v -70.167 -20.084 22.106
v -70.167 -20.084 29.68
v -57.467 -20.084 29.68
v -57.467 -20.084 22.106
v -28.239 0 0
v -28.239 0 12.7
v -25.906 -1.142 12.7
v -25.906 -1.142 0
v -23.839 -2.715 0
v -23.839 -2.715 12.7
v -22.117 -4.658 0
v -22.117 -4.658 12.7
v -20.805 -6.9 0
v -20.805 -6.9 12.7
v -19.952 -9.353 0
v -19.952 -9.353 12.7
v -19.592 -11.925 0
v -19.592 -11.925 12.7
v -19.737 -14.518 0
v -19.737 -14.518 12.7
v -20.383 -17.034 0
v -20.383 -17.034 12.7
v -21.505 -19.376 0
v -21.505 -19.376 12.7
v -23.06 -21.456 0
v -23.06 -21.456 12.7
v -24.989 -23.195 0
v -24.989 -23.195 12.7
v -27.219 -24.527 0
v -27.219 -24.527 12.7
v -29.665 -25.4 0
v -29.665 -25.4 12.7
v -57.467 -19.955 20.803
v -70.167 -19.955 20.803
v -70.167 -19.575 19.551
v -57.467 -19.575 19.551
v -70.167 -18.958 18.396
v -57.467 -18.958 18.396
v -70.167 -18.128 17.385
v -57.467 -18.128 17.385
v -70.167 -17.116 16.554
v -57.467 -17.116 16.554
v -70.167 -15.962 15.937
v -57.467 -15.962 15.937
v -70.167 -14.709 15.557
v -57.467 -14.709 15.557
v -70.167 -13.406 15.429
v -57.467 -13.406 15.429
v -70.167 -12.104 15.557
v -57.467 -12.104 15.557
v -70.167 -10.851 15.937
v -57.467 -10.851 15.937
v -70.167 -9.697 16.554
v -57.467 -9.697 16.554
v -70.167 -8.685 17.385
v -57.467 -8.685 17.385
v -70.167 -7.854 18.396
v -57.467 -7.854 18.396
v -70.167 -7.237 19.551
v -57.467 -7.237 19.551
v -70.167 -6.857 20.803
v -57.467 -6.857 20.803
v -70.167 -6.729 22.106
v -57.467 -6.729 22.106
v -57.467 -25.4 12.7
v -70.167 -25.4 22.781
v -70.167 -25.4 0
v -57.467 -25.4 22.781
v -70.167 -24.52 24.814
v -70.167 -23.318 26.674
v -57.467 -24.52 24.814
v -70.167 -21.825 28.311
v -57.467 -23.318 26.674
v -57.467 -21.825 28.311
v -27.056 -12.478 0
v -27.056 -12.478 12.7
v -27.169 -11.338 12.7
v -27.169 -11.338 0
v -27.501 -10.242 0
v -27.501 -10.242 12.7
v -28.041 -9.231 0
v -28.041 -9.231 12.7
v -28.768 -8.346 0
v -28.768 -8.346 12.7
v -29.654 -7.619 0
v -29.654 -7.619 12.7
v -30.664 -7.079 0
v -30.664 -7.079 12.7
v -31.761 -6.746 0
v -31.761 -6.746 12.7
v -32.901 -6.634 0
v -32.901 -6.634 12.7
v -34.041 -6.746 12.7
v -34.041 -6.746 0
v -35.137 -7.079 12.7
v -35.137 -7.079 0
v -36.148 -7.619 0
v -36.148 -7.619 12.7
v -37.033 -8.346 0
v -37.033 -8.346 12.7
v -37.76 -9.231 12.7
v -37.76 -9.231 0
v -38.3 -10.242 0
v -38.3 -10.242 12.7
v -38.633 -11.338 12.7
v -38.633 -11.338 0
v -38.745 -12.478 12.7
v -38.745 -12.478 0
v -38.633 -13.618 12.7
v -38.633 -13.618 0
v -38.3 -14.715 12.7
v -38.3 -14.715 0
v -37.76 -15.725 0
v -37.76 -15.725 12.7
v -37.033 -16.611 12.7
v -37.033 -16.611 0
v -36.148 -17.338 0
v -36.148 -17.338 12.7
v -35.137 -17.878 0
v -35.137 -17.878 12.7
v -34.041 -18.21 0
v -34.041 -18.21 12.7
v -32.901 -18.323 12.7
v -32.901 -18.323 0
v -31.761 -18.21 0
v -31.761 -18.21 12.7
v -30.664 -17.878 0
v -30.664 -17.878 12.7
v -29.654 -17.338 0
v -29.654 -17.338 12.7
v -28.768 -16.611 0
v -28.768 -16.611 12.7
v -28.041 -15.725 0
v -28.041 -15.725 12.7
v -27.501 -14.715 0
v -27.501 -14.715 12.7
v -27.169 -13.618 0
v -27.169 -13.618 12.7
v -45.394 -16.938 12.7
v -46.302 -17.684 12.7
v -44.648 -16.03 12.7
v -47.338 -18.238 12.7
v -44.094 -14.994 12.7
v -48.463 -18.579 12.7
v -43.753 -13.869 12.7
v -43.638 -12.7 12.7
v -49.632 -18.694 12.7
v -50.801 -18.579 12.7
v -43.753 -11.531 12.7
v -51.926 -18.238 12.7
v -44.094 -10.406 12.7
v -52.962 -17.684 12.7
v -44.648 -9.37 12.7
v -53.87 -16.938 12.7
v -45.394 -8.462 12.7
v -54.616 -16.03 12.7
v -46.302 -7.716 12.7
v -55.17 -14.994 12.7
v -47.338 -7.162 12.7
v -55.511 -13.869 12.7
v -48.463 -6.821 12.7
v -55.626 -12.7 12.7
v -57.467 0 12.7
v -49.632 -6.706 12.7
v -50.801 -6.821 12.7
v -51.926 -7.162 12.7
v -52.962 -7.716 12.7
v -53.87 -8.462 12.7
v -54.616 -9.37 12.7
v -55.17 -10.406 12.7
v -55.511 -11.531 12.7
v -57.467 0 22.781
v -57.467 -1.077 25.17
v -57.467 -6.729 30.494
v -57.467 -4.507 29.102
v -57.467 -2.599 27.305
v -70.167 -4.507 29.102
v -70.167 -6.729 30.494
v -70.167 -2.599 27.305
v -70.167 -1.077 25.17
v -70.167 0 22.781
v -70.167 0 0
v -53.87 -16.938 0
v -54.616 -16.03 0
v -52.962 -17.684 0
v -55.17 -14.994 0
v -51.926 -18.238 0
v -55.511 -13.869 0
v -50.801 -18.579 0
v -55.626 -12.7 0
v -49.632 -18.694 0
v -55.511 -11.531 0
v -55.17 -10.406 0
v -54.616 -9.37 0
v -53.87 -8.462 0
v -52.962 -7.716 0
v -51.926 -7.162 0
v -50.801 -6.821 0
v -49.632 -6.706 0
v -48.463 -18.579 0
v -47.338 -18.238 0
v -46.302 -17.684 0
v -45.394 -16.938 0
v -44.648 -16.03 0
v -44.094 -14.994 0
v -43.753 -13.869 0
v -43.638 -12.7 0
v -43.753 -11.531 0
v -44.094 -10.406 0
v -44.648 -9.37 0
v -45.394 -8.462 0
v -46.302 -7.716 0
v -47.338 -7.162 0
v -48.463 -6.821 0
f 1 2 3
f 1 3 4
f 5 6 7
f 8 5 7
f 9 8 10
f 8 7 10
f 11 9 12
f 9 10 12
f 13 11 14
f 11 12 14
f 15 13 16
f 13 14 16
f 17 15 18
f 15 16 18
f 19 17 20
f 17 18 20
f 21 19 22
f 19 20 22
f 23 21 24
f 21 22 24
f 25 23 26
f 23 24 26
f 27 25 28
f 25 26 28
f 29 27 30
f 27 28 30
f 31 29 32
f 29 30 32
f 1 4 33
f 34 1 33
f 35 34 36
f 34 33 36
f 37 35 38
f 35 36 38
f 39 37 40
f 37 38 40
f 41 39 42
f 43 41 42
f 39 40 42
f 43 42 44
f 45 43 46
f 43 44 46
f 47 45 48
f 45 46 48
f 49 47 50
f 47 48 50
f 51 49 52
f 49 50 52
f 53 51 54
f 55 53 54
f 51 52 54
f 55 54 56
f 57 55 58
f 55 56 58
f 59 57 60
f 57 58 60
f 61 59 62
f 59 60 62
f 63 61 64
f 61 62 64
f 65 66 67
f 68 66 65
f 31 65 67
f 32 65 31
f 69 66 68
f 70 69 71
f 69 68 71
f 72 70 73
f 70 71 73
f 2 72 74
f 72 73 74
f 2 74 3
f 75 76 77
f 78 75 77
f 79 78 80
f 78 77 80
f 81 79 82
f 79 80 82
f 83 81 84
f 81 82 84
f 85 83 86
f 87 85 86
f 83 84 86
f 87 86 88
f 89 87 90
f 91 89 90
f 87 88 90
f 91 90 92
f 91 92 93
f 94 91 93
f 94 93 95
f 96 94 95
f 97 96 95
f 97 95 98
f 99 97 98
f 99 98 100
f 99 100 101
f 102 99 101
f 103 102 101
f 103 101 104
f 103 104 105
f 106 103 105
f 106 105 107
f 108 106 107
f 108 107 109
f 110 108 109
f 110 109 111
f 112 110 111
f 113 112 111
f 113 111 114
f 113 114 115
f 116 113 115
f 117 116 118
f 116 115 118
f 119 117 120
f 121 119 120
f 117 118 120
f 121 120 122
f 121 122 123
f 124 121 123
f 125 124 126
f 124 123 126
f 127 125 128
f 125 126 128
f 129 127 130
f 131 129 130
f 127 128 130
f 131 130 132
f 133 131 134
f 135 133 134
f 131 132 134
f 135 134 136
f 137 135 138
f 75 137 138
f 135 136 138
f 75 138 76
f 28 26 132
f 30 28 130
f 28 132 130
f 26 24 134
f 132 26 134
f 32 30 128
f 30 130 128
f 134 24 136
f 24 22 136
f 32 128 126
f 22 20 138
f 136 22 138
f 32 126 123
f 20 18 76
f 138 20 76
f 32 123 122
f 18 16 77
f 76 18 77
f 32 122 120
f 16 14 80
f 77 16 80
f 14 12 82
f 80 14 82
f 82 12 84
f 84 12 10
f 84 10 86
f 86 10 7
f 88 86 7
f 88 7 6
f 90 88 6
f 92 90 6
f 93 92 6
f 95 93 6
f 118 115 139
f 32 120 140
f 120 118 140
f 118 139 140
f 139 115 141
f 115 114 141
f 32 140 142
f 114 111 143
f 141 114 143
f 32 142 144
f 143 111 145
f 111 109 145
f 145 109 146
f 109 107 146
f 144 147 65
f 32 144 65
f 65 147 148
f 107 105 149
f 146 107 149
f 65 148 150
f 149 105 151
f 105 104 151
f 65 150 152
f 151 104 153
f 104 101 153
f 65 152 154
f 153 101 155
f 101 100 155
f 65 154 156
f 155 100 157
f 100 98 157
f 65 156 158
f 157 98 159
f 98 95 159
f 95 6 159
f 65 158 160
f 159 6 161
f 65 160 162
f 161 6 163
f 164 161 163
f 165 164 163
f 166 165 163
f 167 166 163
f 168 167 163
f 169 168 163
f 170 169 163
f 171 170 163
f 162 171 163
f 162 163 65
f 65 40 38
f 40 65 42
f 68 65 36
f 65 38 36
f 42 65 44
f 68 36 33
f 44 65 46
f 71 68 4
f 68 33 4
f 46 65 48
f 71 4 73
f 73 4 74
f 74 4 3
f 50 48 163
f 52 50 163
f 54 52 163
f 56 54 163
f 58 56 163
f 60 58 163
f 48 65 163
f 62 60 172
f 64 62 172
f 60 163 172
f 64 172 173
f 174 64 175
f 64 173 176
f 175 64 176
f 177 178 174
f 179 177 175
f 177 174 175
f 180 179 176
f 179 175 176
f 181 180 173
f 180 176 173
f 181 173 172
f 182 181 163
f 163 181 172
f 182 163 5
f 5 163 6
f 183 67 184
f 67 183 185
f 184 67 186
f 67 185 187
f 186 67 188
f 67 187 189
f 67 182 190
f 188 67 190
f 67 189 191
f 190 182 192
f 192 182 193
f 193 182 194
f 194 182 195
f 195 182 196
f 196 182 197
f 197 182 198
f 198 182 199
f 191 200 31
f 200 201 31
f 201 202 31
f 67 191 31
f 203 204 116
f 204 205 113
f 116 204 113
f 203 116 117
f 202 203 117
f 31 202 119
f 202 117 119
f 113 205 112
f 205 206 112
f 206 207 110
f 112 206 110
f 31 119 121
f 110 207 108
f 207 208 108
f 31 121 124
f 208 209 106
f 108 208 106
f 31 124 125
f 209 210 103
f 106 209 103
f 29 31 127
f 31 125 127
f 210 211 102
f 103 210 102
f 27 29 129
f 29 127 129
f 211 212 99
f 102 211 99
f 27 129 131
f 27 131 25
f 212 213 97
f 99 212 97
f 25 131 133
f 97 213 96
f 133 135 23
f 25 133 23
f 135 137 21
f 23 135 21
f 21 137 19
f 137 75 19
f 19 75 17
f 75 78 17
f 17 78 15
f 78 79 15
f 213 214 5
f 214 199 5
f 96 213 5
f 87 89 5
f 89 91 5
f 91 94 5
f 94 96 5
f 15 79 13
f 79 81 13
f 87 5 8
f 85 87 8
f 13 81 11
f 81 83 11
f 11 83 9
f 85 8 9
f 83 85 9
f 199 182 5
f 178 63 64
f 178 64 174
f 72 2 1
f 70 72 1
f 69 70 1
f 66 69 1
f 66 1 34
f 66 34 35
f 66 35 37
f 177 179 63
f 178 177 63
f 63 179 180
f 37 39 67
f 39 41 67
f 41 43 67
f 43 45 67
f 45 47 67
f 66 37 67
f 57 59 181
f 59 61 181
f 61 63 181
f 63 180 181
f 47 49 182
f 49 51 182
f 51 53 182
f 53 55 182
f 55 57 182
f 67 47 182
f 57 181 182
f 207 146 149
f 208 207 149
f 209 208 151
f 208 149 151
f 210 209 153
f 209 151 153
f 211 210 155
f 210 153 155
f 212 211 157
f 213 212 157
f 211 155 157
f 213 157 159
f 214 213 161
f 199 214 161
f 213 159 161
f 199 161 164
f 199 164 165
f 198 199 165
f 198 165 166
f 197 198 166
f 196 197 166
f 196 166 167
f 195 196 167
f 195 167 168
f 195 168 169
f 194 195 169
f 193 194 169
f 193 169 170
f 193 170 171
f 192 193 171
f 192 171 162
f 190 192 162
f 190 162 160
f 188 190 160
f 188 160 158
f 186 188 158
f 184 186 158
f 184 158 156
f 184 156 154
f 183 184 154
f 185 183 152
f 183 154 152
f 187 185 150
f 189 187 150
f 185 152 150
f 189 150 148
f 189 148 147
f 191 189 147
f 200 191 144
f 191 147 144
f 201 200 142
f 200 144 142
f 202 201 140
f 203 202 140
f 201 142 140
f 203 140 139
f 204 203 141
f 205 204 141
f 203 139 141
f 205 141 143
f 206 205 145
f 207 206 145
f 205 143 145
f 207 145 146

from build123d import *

# Parameters (mm, degrees)
F1_DEPTH = 25.4
F3_DEPTH = 25.4
F5_DEPTH = 25.4
F7_DEPTH = 25.4
F8_R     = 5.84435
F8_R_2   = 5.993936
F9_DEPTH = 25.4


with BuildPart() as f1:
    # F0 (on Front) → F1 (new body)
    with BuildSketch(Plane.XZ):
        Polygon((-70.167482, 32.861239), (-70.167482, 0), (-19.367482, 0), (-19.367482, 12.7), (-57.467482, 12.7), (-57.467482, 32.861239), align=None)
    extrude(amount=F1_DEPTH)

    # F2 (on face) → F3 (cut)
    with BuildSketch(Plane.YZ.offset(-57.467482)):
        with BuildLine():
            ThreePointArc((-25.4, 22.78062), (-12.7, 31.897256), (0, 22.78062))
            Line((0, 22.78062), (0, 32.861239))
            Line((0, 32.861239), (-25.4, 32.861239))
            Line((-25.4, 32.861239), (-25.4, 22.78062))
        make_face()
    extrude(amount=-F3_DEPTH, mode=Mode.SUBTRACT)

    # F4 (on face) → F5 (cut)
    with BuildSketch(Plane.YZ.offset(-57.467482)):
        with BuildLine():
            ThreePointArc((-20.083626, 22.106148), (-13.406311, 28.783463), (-6.728996, 22.106148))
            Line((-6.728996, 22.106148), (-6.728996, 30.493881))
            ThreePointArc((-6.728996, 30.493881), (-13.515075, 31.872452), (-20.083626, 29.680317))
            Line((-20.083626, 29.680317), (-20.083626, 22.106148))
        make_face()
        with BuildLine():
            ThreePointArc((-20.083626, 22.106148), (-13.406311, 15.428833), (-6.728996, 22.106148))
            ThreePointArc((-6.728996, 22.106148), (-13.406311, 28.783463), (-20.083626, 22.106148))
        make_face()
    extrude(amount=-F5_DEPTH, mode=Mode.SUBTRACT)

    # F6 (on face) → F7 (cut)
    with BuildSketch(Plane.XY.offset(12.7)):
        with BuildLine():
            ThreePointArc((-28.238824, 0), (-19.601071, -13.225048), (-29.665027, -25.4))
            Line((-29.665027, -25.4), (-19.367482, -25.4))
            Line((-19.367482, -25.4), (-19.367482, 0))
            Line((-19.367482, 0), (-28.238824, 0))
        make_face()
    extrude(amount=-F7_DEPTH, mode=Mode.SUBTRACT)

    # F8 (on face) → F9 (cut)
    with BuildSketch(Plane.XY.offset(12.7)):
        with Locations((-32.900844, -12.478269)):
            Circle(F8_R)
        with Locations((-49.631871, -12.7)):
            Circle(F8_R_2)
    extrude(amount=-F9_DEPTH, mode=Mode.SUBTRACT)


solid = f1.part
